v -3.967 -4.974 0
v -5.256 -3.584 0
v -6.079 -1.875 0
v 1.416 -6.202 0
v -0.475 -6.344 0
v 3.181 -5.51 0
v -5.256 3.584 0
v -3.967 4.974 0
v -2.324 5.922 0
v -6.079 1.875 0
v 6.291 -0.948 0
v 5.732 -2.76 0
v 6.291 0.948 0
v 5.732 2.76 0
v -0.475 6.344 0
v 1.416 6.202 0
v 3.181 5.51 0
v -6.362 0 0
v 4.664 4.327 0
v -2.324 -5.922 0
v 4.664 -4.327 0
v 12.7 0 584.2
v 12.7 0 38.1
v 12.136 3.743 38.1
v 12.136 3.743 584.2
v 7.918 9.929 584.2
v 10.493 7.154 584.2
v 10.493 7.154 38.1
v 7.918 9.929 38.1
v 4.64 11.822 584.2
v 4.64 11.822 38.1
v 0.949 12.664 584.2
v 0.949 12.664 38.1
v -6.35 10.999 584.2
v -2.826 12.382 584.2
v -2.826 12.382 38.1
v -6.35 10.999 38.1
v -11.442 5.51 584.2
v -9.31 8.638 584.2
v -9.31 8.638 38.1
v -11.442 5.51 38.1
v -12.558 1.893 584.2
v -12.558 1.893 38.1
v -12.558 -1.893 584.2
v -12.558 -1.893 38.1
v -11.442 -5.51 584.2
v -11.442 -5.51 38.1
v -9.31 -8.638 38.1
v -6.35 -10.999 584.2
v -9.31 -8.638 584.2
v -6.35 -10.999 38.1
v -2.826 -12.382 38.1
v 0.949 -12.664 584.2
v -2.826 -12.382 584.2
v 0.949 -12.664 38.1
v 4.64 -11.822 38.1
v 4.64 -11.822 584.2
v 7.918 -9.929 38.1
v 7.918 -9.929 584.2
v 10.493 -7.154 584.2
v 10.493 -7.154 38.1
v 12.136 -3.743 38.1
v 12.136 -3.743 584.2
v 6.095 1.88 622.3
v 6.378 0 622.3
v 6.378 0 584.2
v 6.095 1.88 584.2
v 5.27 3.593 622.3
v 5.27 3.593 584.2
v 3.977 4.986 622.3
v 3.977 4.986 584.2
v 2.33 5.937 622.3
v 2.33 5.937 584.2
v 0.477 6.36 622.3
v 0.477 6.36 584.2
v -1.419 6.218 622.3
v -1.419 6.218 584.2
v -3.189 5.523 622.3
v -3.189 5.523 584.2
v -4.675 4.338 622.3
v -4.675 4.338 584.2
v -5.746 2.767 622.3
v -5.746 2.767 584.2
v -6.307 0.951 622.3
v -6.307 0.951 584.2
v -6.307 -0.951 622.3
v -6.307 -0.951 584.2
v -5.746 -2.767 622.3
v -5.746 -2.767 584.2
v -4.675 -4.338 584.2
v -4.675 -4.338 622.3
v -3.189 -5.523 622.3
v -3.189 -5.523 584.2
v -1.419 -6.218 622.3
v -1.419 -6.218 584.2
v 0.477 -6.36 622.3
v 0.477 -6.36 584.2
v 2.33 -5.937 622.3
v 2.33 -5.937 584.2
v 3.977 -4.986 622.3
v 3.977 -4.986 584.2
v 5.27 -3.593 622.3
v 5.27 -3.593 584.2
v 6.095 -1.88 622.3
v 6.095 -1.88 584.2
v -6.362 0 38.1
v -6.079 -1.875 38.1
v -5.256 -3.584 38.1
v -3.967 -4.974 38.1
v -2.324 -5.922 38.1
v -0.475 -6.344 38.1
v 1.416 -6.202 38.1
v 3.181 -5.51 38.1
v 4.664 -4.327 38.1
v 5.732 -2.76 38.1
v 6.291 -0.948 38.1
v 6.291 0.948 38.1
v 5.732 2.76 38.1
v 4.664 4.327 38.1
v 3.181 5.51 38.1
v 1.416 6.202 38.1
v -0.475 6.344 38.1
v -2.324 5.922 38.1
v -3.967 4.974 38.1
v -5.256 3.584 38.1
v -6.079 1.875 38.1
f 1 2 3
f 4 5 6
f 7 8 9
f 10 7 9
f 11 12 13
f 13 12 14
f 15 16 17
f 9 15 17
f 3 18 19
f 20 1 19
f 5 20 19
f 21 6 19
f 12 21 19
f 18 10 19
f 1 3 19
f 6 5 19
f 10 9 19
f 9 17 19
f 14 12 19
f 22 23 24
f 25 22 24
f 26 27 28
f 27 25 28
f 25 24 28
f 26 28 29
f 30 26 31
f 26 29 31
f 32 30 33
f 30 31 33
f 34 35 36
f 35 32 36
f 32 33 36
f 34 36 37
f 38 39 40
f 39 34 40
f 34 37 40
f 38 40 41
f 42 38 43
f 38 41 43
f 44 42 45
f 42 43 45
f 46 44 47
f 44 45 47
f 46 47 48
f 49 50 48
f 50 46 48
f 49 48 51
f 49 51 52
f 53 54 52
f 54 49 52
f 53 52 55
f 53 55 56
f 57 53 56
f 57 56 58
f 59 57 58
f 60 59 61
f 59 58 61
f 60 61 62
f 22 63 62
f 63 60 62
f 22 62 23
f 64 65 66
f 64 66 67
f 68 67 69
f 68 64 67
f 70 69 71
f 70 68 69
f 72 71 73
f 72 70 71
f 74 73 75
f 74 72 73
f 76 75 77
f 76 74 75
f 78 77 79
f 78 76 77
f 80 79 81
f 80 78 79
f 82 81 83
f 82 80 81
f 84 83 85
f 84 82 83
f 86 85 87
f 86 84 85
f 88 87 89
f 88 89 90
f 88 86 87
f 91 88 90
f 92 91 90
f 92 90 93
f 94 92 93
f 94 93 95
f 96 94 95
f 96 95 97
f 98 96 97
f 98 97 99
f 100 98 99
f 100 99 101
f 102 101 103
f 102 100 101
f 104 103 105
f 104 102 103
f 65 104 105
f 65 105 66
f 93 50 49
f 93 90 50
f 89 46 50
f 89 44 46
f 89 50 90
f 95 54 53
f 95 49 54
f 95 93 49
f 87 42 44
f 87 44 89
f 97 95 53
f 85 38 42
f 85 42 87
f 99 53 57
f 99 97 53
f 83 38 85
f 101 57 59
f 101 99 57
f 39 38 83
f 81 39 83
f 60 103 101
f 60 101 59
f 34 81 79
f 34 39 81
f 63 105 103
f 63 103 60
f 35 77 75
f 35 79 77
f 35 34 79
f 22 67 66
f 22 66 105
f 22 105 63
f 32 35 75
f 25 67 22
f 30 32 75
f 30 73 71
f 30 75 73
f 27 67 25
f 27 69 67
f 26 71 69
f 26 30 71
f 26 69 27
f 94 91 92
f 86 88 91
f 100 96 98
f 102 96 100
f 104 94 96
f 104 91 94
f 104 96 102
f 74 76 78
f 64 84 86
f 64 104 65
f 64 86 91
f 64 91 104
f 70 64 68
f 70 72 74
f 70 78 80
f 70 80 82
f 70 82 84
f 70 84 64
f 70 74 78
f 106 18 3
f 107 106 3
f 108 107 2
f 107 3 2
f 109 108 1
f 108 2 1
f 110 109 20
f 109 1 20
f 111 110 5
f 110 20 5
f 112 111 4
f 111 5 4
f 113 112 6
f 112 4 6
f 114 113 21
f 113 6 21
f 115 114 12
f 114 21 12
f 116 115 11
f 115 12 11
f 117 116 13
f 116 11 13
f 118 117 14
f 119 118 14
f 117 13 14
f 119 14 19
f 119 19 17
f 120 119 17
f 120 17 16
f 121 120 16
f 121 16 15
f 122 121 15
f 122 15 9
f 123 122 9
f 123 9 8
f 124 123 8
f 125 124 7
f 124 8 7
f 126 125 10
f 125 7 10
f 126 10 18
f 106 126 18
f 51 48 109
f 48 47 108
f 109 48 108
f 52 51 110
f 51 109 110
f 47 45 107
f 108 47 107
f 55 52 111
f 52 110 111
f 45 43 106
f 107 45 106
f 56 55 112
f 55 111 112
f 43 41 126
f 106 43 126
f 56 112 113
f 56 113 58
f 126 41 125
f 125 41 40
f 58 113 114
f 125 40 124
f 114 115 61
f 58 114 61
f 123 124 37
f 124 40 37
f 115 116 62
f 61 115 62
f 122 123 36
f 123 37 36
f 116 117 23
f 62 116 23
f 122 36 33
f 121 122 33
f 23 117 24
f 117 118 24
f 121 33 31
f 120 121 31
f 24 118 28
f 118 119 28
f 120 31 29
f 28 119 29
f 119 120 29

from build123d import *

# Parameters (mm, degrees)
SKETCH1_R           = 12.7
BOSS_EXTRUDE1_DEPTH = 622.3
SKETCH2_OUTSIDE_W   = 152.068
SKETCH2_OUTSIDE_H   = 152.068
SKETCH2_OUTSIDE_R   = 6.361935525
CUT_EXTRUDE1_DEPTH  = 38.1
SKETCH5_OUTSIDE_W   = 152.068
SKETCH5_OUTSIDE_H   = 152.068
SKETCH5_OUTSIDE_R   = 6.377907631
CUT_EXTRUDE4_DEPTH  = 38.1


with BuildPart() as part:
    # Sketch1 → Boss-Extrude1 (new body)
    with BuildSketch(Plane.XY):
        Circle(SKETCH1_R)
    extrude(amount=BOSS_EXTRUDE1_DEPTH)

    # Sketch2 outside → Cut-Extrude1 (cut)
    with BuildSketch(Plane.XY):
        Rectangle(SKETCH2_OUTSIDE_W, SKETCH2_OUTSIDE_H)
        with Locations(Location((0, 0, 0), (0, 0, 180))):
            Circle(SKETCH2_OUTSIDE_R, mode=Mode.SUBTRACT)
    extrude(amount=CUT_EXTRUDE1_DEPTH, mode=Mode.SUBTRACT)

    # Sketch5 outside → Cut-Extrude4 (cut)
    with BuildSketch(Plane.XY.offset(622.3)):
        Rectangle(SKETCH5_OUTSIDE_W, SKETCH5_OUTSIDE_H)
        Circle(SKETCH5_OUTSIDE_R, mode=Mode.SUBTRACT)
    extrude(amount=-CUT_EXTRUDE4_DEPTH, mode=Mode.SUBTRACT)


solid = part.part
